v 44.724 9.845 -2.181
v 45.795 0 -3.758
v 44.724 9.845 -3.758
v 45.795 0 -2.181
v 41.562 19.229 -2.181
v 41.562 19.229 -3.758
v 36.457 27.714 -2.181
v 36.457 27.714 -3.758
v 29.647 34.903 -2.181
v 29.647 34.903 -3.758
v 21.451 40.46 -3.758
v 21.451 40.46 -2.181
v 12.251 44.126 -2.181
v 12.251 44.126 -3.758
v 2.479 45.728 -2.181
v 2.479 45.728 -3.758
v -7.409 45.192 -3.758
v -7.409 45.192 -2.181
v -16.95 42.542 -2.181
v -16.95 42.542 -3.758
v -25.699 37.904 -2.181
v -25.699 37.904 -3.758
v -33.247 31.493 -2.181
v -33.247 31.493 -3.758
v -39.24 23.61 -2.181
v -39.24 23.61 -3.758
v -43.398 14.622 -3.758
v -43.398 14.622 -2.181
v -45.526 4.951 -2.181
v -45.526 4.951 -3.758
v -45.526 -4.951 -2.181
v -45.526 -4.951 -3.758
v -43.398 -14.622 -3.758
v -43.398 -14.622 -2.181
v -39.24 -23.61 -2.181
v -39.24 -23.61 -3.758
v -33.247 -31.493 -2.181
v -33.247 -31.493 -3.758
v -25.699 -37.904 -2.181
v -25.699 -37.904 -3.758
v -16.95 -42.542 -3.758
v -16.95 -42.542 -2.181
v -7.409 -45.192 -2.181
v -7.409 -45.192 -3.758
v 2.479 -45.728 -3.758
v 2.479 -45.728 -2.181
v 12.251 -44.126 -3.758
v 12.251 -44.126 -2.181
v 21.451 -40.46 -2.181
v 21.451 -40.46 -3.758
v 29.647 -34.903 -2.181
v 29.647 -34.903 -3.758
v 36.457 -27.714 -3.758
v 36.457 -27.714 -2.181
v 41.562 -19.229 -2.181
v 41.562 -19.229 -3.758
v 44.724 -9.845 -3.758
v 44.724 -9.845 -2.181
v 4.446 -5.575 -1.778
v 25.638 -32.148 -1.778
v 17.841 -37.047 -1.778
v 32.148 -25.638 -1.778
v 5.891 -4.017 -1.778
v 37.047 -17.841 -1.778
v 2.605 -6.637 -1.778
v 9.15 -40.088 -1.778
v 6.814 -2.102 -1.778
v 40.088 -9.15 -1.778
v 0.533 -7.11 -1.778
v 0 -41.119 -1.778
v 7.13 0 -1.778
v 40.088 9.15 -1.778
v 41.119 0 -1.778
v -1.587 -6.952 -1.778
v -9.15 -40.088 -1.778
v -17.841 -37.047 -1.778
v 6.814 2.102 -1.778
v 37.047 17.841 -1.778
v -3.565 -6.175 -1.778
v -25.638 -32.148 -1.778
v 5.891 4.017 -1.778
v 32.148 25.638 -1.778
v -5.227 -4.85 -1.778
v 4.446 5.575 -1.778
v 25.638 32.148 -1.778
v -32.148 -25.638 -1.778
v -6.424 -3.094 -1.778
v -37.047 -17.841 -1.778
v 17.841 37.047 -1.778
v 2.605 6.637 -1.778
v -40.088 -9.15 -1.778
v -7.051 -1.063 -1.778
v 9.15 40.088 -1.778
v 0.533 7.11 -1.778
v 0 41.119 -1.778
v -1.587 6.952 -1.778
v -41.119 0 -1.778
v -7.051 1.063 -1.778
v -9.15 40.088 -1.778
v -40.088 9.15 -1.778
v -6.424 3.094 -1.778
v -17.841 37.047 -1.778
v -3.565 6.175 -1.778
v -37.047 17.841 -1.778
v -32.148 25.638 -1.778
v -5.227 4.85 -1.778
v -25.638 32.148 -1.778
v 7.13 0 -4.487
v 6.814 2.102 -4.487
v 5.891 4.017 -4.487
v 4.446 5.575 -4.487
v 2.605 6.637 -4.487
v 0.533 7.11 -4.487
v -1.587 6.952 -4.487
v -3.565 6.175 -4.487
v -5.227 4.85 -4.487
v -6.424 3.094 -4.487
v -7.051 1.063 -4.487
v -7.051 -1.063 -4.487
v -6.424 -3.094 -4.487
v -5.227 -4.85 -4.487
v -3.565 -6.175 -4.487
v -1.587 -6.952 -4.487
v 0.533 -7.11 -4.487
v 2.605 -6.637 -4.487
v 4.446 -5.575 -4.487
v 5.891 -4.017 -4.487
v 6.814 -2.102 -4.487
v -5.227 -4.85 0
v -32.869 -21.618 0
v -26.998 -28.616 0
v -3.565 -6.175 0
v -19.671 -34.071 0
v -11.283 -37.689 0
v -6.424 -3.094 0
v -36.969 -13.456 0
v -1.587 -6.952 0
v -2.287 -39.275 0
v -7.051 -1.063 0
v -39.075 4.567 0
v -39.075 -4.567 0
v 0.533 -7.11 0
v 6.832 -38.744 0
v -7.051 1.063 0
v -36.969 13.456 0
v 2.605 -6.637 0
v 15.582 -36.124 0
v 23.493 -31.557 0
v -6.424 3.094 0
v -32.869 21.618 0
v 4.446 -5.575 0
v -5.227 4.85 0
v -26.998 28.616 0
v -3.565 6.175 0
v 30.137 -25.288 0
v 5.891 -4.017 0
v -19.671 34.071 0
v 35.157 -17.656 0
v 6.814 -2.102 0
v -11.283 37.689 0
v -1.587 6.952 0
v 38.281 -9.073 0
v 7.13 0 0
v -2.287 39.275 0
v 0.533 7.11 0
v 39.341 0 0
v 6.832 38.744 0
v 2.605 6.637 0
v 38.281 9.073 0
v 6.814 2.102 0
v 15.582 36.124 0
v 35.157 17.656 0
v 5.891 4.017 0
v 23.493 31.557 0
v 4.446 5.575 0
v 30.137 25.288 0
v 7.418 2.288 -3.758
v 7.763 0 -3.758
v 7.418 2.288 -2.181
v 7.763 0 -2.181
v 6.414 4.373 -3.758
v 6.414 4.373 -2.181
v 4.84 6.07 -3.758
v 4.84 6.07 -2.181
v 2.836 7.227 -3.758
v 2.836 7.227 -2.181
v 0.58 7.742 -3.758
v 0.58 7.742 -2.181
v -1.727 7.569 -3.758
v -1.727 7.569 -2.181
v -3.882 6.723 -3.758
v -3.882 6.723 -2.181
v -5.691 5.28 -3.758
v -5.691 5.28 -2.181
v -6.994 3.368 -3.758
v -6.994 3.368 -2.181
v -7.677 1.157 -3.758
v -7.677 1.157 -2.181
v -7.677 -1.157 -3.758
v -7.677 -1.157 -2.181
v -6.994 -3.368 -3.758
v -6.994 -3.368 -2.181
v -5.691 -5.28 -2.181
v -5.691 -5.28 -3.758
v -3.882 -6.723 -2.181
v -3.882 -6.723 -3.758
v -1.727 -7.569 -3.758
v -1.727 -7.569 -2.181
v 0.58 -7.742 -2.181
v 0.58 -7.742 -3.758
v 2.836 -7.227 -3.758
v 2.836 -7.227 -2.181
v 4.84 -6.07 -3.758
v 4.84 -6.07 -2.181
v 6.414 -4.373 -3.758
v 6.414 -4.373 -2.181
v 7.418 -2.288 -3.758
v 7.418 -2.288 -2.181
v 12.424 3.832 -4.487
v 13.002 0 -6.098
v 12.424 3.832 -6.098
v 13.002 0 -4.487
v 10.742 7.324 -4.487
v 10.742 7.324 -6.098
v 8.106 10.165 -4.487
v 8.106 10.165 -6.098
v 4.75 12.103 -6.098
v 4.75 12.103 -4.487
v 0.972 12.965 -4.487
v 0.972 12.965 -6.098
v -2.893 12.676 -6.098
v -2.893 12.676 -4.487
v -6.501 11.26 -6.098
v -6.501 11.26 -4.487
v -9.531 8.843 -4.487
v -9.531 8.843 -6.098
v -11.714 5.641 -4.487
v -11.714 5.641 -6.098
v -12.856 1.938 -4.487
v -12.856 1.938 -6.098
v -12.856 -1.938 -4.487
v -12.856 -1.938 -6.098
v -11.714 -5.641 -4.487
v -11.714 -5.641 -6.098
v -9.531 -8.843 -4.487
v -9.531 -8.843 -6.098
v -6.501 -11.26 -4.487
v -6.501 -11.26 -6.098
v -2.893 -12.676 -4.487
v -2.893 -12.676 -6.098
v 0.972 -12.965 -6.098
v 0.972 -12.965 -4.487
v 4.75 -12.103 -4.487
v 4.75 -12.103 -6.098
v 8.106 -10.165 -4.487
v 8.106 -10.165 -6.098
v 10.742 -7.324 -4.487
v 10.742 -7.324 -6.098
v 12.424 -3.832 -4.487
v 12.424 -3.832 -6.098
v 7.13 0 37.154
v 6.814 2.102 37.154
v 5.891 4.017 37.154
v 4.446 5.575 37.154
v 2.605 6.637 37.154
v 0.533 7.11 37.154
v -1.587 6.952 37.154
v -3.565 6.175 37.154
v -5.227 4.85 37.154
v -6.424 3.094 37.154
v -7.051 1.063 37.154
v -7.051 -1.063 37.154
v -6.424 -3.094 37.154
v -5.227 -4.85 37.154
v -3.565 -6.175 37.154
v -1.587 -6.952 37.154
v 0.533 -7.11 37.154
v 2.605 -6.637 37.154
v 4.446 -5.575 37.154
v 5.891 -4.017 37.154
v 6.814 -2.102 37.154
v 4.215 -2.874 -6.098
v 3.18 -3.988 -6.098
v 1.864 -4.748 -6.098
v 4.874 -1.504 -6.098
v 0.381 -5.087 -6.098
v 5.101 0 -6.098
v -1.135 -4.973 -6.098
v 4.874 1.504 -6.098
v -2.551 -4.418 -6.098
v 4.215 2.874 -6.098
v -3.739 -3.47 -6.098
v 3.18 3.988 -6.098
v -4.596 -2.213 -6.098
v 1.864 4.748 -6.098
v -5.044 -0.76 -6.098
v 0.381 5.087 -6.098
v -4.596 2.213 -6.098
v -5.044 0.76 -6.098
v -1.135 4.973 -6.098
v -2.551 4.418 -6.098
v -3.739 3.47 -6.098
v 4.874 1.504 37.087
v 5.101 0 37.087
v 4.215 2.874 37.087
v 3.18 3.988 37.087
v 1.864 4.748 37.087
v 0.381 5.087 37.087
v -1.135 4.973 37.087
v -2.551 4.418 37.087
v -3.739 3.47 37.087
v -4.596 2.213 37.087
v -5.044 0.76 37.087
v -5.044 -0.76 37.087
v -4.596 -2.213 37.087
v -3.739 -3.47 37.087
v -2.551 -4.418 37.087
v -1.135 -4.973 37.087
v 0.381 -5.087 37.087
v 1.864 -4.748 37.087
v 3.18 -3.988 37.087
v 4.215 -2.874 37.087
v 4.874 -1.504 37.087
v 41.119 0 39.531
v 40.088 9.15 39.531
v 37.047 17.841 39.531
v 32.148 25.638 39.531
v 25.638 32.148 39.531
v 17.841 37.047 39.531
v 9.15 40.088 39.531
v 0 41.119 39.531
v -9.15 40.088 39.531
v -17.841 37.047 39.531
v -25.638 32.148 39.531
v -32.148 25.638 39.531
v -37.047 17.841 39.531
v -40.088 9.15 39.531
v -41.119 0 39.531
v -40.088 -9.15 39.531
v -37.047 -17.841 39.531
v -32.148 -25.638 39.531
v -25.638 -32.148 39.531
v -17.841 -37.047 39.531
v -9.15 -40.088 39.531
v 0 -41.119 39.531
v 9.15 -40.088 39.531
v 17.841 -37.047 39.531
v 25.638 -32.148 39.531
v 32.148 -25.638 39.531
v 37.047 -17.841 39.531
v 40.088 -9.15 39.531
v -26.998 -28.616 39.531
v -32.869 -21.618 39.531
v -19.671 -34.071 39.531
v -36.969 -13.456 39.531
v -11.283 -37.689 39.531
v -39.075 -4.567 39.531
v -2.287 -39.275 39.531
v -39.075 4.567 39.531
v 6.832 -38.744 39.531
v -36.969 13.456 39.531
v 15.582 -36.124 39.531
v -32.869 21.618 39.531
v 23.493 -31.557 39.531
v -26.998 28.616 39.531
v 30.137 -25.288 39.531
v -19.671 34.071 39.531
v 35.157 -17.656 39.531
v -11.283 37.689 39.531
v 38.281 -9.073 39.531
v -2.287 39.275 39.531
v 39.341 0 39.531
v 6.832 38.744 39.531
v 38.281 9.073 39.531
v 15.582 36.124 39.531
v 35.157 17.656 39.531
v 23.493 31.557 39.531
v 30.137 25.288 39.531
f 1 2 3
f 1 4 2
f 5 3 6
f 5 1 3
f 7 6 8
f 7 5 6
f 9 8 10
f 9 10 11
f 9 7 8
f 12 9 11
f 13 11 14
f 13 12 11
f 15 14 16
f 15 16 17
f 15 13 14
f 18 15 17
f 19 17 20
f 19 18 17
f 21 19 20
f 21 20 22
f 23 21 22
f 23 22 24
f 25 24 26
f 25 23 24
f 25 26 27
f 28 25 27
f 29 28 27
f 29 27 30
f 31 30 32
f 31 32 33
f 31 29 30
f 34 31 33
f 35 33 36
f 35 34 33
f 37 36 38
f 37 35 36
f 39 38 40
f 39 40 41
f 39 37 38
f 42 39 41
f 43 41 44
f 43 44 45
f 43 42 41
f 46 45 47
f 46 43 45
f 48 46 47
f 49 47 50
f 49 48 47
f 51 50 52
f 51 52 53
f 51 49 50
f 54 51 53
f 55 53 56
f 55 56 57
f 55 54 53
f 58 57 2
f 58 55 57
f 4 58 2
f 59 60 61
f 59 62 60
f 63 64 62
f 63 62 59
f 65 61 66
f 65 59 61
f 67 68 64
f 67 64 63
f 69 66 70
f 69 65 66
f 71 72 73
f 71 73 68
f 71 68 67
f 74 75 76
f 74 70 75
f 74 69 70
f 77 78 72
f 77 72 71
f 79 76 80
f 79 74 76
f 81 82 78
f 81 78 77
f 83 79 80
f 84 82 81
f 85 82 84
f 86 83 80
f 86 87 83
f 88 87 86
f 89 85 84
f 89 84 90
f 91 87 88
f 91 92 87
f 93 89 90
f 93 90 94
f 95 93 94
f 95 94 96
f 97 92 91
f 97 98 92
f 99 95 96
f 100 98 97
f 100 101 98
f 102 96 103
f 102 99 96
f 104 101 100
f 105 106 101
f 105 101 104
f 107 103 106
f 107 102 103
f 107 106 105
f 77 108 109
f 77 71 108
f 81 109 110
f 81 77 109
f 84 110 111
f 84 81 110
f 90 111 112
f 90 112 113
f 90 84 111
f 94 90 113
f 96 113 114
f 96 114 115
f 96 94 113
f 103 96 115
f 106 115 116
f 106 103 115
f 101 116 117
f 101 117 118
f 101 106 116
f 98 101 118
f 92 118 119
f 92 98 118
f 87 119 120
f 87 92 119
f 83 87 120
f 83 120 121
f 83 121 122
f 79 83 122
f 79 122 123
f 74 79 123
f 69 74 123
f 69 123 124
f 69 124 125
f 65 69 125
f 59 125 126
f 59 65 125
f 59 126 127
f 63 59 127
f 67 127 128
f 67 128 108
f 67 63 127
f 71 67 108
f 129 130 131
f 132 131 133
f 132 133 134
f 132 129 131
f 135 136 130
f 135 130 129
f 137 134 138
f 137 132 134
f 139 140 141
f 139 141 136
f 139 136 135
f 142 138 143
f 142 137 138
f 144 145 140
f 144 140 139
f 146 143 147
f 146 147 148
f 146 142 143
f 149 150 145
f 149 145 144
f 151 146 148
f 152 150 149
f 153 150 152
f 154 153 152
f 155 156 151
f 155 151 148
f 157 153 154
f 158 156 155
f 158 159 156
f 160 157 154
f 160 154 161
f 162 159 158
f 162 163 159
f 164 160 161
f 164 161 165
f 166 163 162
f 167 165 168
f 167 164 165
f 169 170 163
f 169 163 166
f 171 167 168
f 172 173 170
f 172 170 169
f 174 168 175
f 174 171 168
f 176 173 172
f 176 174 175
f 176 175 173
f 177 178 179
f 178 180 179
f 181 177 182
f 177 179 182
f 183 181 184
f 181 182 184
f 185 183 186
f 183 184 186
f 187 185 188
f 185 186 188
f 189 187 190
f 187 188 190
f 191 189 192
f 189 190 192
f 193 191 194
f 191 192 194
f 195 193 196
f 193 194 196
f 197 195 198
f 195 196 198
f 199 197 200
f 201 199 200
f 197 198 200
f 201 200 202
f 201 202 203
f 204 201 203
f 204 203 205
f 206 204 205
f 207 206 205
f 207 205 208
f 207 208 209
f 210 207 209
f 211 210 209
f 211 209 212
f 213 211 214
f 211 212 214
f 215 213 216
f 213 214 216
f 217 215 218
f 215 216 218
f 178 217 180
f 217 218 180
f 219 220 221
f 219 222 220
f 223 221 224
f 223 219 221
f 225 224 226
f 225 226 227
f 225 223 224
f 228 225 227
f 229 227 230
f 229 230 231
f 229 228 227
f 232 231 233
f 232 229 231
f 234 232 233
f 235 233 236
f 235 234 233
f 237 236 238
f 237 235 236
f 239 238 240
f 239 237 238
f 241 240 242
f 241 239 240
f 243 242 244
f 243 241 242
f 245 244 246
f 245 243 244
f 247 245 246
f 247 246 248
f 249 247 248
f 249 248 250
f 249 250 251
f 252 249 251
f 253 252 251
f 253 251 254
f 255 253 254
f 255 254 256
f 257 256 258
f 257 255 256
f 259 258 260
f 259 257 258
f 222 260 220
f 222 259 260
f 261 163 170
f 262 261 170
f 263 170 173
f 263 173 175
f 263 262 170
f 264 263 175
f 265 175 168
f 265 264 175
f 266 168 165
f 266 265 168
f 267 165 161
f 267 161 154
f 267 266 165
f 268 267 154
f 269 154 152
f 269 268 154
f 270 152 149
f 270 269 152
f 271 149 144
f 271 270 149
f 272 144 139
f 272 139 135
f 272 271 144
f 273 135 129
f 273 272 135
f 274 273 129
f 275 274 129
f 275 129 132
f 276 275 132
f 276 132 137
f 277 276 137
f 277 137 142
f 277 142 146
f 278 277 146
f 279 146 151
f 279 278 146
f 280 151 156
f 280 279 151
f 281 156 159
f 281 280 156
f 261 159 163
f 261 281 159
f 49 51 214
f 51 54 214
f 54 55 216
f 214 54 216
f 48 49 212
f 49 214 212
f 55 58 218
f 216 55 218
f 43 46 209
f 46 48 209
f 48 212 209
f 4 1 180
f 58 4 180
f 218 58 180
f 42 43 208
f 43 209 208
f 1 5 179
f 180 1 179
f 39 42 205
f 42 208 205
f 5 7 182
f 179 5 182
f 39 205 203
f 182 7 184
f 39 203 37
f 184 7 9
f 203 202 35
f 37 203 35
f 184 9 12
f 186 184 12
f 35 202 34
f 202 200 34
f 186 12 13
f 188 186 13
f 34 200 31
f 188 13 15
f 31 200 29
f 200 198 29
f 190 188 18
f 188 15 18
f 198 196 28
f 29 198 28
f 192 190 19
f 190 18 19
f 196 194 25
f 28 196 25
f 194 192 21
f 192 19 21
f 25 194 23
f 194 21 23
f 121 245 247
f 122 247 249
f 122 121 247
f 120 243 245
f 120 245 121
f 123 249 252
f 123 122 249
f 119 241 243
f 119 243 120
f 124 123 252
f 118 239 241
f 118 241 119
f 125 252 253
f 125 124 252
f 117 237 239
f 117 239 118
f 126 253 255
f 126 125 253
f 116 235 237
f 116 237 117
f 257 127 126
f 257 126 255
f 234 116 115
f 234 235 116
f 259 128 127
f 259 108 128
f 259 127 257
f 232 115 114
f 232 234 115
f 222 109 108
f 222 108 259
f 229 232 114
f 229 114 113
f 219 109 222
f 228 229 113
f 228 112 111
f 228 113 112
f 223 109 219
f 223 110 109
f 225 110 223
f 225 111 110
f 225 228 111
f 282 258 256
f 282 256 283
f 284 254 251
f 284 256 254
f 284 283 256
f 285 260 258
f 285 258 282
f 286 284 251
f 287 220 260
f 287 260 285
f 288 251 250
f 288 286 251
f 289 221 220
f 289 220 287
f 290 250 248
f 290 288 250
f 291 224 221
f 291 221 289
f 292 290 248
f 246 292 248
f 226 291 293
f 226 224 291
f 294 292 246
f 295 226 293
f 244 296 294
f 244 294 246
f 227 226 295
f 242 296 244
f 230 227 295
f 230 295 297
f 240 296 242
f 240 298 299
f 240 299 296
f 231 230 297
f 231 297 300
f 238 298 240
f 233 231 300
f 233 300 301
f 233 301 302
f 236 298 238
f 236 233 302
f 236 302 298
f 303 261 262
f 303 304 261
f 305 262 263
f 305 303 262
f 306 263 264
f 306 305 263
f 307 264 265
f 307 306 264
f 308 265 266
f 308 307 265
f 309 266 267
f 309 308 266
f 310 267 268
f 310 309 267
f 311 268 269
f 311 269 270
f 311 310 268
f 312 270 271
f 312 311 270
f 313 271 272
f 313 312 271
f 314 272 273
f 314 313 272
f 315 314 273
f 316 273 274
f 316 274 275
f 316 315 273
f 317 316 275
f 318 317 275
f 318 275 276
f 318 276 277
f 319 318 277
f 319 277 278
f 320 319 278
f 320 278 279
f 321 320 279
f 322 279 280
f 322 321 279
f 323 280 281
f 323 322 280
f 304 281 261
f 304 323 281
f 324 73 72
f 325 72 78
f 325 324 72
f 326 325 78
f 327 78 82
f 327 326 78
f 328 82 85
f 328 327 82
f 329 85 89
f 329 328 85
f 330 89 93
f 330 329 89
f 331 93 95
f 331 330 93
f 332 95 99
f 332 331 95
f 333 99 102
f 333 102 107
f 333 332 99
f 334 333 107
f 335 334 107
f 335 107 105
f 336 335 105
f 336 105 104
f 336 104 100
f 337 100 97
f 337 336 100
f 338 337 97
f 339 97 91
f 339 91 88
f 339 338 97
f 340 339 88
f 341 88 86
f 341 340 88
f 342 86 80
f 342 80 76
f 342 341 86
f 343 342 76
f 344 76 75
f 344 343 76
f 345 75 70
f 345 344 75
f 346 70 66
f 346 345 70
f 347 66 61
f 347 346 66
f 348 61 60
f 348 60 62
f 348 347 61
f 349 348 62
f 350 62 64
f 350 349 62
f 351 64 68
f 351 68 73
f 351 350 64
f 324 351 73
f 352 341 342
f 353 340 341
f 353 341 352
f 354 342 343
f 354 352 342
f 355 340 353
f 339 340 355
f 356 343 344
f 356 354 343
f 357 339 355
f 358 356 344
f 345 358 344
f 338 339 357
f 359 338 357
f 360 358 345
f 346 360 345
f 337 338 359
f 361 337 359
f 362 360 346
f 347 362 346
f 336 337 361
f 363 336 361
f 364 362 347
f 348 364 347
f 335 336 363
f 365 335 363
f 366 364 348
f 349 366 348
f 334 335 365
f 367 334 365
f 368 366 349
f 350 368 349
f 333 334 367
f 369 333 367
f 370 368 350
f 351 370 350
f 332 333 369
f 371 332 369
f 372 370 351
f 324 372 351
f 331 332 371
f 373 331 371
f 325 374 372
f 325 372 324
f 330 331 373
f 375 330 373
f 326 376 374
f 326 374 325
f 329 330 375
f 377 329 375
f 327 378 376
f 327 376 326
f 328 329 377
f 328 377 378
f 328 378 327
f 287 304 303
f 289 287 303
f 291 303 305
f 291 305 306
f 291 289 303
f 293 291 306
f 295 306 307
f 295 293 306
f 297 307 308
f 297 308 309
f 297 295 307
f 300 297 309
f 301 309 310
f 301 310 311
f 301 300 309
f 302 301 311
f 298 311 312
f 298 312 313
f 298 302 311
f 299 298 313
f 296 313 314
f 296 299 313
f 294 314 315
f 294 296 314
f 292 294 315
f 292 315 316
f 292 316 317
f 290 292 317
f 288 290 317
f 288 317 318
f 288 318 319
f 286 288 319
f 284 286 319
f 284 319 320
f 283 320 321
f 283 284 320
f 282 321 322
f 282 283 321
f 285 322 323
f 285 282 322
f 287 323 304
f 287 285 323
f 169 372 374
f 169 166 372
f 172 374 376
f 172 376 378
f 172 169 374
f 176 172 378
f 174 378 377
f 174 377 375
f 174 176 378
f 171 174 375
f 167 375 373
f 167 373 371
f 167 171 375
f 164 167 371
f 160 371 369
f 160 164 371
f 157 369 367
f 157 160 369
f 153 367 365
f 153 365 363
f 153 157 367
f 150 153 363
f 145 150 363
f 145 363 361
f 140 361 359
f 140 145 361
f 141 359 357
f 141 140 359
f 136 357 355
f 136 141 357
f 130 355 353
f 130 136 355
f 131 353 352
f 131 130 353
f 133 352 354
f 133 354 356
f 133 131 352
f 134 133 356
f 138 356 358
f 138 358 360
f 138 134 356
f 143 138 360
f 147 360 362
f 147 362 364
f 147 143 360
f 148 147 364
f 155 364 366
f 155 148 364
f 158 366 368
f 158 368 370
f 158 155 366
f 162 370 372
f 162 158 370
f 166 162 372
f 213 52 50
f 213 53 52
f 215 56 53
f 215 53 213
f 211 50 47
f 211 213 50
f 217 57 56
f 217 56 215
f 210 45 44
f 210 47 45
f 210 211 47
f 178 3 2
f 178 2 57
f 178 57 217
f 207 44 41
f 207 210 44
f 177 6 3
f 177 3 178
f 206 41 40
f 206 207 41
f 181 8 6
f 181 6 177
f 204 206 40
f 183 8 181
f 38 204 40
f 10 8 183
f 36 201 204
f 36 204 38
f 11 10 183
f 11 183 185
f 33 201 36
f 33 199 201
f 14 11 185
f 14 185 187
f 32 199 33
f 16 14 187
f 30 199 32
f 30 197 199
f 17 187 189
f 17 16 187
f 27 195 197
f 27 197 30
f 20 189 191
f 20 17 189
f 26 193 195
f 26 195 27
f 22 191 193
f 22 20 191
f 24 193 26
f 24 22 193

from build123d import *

# Parameters (mm, degrees)
F0_W = 38.031577
F0_H = 1.577056


with BuildPart() as f1:
    # F0 (on Front) → F1 (revolve)
    with BuildSketch(Plane.XZ):
        Polygon((39.341409, 0), (7.130294, 0), (7.130294, 37.154283), (5.101061, 37.087251), (5.101061, 0), (5.101061, -6.098447), (13.001503, -6.098447), (13.001503, -4.487136), (7.130294, -4.487136), (7.130294, -1.778), (41.119409, -1.778), (41.119409, 39.531007), (39.341409, 39.531007), align=None)
        with Locations((26.779018, -2.969895)):
            Rectangle(F0_W, F0_H)
    revolve(axis=Axis((0, 0, 17.398385), (0, 0, 1)))


solid = f1.part
